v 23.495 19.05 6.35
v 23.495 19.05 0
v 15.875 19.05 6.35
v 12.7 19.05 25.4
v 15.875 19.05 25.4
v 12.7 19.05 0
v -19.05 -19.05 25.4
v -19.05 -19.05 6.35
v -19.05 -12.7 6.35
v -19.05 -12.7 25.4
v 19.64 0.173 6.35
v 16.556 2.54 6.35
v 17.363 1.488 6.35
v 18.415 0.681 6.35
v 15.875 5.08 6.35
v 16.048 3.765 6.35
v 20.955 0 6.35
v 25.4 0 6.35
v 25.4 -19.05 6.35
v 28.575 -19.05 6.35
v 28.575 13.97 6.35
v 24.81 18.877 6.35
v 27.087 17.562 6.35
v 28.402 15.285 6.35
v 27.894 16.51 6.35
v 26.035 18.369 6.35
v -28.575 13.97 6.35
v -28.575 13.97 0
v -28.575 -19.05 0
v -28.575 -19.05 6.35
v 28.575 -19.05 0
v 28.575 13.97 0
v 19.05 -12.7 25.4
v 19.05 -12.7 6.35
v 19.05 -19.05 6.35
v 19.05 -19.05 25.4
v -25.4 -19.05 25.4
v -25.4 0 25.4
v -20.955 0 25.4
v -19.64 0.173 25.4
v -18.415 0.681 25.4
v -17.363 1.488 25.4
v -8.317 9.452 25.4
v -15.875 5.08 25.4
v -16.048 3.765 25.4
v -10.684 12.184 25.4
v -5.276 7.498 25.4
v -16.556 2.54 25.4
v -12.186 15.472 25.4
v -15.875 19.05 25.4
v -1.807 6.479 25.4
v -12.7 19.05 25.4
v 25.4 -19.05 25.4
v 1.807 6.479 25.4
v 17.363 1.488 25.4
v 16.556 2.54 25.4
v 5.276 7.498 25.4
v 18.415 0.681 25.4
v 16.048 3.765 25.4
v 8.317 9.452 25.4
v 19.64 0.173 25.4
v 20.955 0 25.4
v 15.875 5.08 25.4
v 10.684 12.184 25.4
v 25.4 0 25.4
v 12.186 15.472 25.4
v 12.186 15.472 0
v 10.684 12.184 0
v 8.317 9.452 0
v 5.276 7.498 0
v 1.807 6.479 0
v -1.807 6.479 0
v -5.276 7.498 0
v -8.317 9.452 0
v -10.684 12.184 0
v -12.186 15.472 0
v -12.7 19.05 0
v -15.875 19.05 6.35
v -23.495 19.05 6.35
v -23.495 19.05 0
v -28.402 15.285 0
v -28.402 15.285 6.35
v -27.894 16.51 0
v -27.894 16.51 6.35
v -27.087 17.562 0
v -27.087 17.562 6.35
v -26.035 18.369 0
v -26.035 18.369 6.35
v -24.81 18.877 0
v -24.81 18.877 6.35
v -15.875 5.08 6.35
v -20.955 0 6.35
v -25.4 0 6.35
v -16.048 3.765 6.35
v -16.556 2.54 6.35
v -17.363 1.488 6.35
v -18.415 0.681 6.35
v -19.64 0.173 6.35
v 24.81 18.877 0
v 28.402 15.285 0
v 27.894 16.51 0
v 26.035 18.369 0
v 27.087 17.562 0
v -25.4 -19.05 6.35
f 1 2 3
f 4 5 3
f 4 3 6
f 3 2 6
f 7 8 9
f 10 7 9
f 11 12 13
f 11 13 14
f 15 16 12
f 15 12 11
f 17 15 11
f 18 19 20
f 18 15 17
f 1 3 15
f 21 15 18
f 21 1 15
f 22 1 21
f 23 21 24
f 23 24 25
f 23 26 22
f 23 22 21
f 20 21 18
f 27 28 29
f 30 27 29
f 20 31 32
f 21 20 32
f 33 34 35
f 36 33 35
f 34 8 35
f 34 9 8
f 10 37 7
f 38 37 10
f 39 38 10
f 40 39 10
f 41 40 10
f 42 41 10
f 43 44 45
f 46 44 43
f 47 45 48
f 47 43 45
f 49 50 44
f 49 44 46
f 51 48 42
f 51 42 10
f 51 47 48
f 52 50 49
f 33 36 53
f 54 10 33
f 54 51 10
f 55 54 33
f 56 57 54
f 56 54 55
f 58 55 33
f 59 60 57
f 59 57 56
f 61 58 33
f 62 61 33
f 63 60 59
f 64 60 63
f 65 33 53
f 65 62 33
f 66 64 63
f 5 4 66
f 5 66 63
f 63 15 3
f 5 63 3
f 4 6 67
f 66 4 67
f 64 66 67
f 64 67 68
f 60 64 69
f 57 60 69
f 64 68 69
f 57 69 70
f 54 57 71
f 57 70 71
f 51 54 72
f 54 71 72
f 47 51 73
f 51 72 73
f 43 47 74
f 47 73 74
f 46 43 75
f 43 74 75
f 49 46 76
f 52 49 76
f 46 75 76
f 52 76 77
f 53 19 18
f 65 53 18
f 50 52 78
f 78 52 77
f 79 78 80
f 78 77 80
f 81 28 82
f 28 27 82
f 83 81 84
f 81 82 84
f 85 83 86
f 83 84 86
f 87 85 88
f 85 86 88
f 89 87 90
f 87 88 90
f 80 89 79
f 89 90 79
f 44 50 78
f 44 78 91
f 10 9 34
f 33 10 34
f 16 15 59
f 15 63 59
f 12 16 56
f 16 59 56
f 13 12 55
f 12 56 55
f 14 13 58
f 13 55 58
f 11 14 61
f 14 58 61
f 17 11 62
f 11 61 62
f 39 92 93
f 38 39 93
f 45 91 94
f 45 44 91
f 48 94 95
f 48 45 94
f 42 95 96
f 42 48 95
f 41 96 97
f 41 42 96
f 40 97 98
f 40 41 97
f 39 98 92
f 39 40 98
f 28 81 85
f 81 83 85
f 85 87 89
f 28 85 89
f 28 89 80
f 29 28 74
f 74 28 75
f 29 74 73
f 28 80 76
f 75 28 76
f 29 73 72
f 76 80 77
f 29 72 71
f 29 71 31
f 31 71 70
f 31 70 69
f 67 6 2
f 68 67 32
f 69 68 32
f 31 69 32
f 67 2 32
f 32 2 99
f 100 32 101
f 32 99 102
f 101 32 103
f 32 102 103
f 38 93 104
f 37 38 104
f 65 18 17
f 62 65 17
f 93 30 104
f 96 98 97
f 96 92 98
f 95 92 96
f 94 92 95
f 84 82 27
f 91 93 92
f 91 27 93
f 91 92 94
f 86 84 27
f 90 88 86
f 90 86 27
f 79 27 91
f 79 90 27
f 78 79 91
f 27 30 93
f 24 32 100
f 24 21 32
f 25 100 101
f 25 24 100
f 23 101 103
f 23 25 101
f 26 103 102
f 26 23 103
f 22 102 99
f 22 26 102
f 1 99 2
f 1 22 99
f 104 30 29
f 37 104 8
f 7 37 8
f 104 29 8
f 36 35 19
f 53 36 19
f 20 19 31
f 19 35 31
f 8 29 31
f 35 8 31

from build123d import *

# Parameters (mm, degrees)
F1_DEPTH = 6.35
F3_DEPTH = 19.05
F4_R     = 5.08


with BuildPart() as f1:
    # F0 (on Top) → F1 (new body)
    with BuildSketch(Plane.XY):
        with BuildLine():
            Line((28.575, -19.05), (28.575, 19.05))
            Line((28.575, 19.05), (12.7, 19.05))
            ThreePointArc((12.7, 19.05), (0, 6.35), (-12.7, 19.05))
            Line((-12.7, 19.05), (-28.575, 19.05))
            Line((-28.575, 19.05), (-28.575, -19.05))
            Line((-28.575, -19.05), (28.575, -19.05))
        make_face()
    extrude(amount=F1_DEPTH)

    # F2 (on face) → F3 (join)
    with BuildSketch(Plane.XY.offset(6.35)):
        with BuildLine():
            Line((-15.875, 19.05), (-15.875, 0))
            Line((-15.875, 0), (15.875, 0))
            Line((15.875, 0), (15.875, 19.05))
            Line((15.875, 19.05), (12.7, 19.05))
            ThreePointArc((12.7, 19.05), (0, 6.35), (-12.7, 19.05))
            Line((-12.7, 19.05), (-15.875, 19.05))
        make_face()
        Polygon((-25.4, 0), (-25.4, -19.05), (-19.05, -19.05), (-19.05, -12.7), (19.05, -12.7), (19.05, -19.05), (25.4, -19.05), (25.4, 0), (15.875, 0), (-15.875, 0), align=None)
    extrude(amount=F3_DEPTH)

    # F4
    f4_edges = [f1.edges().sort_by_distance(p)[0] for p in [
        (-28.575, 19.05, 3.175),
        (28.575, 19.05, 3.175),
        (-15.875, 0, 15.875),
        (15.875, 0, 15.875),
    ]]
    fillet(f4_edges, radius=F4_R)


solid = f1.part
